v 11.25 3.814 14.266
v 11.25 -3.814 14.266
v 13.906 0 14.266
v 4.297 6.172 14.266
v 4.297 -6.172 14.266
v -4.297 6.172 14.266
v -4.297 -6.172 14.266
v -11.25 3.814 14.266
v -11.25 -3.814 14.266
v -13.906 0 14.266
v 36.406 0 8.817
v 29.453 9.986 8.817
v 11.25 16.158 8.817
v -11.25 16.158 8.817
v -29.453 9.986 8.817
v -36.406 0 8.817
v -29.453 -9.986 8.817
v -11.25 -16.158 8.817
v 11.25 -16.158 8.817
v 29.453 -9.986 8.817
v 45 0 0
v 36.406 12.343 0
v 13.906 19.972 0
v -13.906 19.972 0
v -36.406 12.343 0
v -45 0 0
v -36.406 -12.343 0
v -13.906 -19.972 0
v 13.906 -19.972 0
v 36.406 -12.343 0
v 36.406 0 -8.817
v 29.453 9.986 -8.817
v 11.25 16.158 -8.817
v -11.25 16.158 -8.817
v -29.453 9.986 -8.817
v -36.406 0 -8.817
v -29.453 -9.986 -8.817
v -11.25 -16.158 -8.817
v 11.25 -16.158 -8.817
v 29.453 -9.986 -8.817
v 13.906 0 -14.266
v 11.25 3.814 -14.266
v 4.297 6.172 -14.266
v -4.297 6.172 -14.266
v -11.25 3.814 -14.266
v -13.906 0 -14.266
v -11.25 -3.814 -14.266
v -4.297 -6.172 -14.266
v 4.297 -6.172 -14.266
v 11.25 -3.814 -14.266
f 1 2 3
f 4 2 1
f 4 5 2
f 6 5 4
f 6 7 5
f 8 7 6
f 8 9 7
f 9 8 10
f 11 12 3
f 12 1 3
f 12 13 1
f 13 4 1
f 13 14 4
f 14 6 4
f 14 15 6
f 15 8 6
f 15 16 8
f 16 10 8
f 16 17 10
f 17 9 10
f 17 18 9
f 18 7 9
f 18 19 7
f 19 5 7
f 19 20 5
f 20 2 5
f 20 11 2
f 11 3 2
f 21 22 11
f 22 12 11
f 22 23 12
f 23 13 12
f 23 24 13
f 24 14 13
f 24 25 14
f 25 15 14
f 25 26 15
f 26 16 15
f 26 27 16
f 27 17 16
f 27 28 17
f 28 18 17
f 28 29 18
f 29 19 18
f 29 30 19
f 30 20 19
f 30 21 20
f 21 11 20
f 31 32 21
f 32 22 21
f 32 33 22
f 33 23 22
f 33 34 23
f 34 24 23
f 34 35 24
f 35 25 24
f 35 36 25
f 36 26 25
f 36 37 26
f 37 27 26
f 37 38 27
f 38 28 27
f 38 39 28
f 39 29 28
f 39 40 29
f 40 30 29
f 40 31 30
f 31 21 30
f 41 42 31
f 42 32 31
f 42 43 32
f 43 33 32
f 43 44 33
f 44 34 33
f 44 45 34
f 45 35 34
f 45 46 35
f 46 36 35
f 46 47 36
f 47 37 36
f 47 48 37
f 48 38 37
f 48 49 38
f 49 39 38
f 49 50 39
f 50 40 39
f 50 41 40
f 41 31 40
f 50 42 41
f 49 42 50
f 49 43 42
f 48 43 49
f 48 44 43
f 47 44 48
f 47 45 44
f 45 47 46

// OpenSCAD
// Generated by SolidPython 1.0.1 on 2020-07-29 00:46:51


scale(v = [15, 7, 5]) {
	sphere(r = 3);
}
/***********************************************
*********      SolidPython code:      **********
************************************************
 
# import packages: SolidPython
from solid import *
from solid.utils import *
from itertools import chain, combinations, permutations


class Resize:

    def __init__(self, scad_file):
        self.scad_file = scad_file
        #self.scad_file = import_scad(scad_file)
        # cone/cylinder param:
        self.r1 = 0
        self.r2 = 0
        self.h = 0
        # rectangular prism param:
        self.w = 0
        self.l = 0
        # ellipse param:
        self.r = 0

    # import OpenScad code (file name corresponds to shape)


    # classify shape + parameters
    def assign(self, param1, param2, param3):
        if self.scad_file == 'cone.scad':
            self.r1 = param1
            self.r2 = param2
            self.h = param3
        elif self.scad_file == 'cylinder.scad':
            self.r1 = param1
            self.r2 = param2
            self.h = param3
        elif self.scad_file == 'rectangularPrism.scad':
            self.h = param1
            self.l = param2
            self.w = param3
        else:
            self.r = param1
            self.h = param2

    # resize parameters
    def iterate(self):
        x = range(3, 20, 2)
        i = 1
        if self.scad_file == 'cone.scad':
            tempList = list(permutations(x, 2))
            for temp in tempList:
                param1 = temp[0]
                param2 = temp[1]
                filepath = 'produced_scad_files/' + 'cone' + str(param1) + '_' + str(param2) + '_' + '.scad'
                scad_render_to_file(cylinder(h=param1, r1=param2, r2=0), filepath)

        elif self.scad_file == 'cylinder.scad':
            tempList = list(permutations(x, 3))
            for temp in tempList:
                param1 = temp[0]
                param2 = temp[1]
                filepath = 'produced_scad_files/' + 'cylinder' + str(param1) + '_' + str(param2) + '_' + '.scad'
                scad_render_to_file(cylinder(h=param1, r1=param2, r2=param2), filepath)

        elif self.scad_file == 'rectangularPrism.scad':
            tempList = list(permutations(x, 3))
            for temp in tempList:
                param1 = temp[0]
                param2 = temp[1]
                param3 = temp[2]
                filepath = 'produced_scad_files/' + 'rectangularPrism' + str(param1) + '_' + str(param2) + '_' + str(
                    param3) + '.scad'
                scad_render_to_file(cube(size=(param1, param2, param3)), filepath)

        elif self.scad_file == 'ellipse.scad':
            tempList = list(permutations(x, 4))
            for temp in tempList:
                param1 = temp[0]
                param2 = temp[1]
                param3 = temp[2]
                param4 = temp[3]
                filepath = 'produced_scad_files/' + 'ellipse' + str(param1) + '_' + str(param2) + '_' + str(param3) + '_' + str(param4) + '.scad'
                scad_render_to_file(scale([param1, param2, param3])(sphere(r=param4)), filepath)

    def render_to_scadfile(self):
        scad_render_to_file(scad, 'example.scad') 
 
************************************************/
